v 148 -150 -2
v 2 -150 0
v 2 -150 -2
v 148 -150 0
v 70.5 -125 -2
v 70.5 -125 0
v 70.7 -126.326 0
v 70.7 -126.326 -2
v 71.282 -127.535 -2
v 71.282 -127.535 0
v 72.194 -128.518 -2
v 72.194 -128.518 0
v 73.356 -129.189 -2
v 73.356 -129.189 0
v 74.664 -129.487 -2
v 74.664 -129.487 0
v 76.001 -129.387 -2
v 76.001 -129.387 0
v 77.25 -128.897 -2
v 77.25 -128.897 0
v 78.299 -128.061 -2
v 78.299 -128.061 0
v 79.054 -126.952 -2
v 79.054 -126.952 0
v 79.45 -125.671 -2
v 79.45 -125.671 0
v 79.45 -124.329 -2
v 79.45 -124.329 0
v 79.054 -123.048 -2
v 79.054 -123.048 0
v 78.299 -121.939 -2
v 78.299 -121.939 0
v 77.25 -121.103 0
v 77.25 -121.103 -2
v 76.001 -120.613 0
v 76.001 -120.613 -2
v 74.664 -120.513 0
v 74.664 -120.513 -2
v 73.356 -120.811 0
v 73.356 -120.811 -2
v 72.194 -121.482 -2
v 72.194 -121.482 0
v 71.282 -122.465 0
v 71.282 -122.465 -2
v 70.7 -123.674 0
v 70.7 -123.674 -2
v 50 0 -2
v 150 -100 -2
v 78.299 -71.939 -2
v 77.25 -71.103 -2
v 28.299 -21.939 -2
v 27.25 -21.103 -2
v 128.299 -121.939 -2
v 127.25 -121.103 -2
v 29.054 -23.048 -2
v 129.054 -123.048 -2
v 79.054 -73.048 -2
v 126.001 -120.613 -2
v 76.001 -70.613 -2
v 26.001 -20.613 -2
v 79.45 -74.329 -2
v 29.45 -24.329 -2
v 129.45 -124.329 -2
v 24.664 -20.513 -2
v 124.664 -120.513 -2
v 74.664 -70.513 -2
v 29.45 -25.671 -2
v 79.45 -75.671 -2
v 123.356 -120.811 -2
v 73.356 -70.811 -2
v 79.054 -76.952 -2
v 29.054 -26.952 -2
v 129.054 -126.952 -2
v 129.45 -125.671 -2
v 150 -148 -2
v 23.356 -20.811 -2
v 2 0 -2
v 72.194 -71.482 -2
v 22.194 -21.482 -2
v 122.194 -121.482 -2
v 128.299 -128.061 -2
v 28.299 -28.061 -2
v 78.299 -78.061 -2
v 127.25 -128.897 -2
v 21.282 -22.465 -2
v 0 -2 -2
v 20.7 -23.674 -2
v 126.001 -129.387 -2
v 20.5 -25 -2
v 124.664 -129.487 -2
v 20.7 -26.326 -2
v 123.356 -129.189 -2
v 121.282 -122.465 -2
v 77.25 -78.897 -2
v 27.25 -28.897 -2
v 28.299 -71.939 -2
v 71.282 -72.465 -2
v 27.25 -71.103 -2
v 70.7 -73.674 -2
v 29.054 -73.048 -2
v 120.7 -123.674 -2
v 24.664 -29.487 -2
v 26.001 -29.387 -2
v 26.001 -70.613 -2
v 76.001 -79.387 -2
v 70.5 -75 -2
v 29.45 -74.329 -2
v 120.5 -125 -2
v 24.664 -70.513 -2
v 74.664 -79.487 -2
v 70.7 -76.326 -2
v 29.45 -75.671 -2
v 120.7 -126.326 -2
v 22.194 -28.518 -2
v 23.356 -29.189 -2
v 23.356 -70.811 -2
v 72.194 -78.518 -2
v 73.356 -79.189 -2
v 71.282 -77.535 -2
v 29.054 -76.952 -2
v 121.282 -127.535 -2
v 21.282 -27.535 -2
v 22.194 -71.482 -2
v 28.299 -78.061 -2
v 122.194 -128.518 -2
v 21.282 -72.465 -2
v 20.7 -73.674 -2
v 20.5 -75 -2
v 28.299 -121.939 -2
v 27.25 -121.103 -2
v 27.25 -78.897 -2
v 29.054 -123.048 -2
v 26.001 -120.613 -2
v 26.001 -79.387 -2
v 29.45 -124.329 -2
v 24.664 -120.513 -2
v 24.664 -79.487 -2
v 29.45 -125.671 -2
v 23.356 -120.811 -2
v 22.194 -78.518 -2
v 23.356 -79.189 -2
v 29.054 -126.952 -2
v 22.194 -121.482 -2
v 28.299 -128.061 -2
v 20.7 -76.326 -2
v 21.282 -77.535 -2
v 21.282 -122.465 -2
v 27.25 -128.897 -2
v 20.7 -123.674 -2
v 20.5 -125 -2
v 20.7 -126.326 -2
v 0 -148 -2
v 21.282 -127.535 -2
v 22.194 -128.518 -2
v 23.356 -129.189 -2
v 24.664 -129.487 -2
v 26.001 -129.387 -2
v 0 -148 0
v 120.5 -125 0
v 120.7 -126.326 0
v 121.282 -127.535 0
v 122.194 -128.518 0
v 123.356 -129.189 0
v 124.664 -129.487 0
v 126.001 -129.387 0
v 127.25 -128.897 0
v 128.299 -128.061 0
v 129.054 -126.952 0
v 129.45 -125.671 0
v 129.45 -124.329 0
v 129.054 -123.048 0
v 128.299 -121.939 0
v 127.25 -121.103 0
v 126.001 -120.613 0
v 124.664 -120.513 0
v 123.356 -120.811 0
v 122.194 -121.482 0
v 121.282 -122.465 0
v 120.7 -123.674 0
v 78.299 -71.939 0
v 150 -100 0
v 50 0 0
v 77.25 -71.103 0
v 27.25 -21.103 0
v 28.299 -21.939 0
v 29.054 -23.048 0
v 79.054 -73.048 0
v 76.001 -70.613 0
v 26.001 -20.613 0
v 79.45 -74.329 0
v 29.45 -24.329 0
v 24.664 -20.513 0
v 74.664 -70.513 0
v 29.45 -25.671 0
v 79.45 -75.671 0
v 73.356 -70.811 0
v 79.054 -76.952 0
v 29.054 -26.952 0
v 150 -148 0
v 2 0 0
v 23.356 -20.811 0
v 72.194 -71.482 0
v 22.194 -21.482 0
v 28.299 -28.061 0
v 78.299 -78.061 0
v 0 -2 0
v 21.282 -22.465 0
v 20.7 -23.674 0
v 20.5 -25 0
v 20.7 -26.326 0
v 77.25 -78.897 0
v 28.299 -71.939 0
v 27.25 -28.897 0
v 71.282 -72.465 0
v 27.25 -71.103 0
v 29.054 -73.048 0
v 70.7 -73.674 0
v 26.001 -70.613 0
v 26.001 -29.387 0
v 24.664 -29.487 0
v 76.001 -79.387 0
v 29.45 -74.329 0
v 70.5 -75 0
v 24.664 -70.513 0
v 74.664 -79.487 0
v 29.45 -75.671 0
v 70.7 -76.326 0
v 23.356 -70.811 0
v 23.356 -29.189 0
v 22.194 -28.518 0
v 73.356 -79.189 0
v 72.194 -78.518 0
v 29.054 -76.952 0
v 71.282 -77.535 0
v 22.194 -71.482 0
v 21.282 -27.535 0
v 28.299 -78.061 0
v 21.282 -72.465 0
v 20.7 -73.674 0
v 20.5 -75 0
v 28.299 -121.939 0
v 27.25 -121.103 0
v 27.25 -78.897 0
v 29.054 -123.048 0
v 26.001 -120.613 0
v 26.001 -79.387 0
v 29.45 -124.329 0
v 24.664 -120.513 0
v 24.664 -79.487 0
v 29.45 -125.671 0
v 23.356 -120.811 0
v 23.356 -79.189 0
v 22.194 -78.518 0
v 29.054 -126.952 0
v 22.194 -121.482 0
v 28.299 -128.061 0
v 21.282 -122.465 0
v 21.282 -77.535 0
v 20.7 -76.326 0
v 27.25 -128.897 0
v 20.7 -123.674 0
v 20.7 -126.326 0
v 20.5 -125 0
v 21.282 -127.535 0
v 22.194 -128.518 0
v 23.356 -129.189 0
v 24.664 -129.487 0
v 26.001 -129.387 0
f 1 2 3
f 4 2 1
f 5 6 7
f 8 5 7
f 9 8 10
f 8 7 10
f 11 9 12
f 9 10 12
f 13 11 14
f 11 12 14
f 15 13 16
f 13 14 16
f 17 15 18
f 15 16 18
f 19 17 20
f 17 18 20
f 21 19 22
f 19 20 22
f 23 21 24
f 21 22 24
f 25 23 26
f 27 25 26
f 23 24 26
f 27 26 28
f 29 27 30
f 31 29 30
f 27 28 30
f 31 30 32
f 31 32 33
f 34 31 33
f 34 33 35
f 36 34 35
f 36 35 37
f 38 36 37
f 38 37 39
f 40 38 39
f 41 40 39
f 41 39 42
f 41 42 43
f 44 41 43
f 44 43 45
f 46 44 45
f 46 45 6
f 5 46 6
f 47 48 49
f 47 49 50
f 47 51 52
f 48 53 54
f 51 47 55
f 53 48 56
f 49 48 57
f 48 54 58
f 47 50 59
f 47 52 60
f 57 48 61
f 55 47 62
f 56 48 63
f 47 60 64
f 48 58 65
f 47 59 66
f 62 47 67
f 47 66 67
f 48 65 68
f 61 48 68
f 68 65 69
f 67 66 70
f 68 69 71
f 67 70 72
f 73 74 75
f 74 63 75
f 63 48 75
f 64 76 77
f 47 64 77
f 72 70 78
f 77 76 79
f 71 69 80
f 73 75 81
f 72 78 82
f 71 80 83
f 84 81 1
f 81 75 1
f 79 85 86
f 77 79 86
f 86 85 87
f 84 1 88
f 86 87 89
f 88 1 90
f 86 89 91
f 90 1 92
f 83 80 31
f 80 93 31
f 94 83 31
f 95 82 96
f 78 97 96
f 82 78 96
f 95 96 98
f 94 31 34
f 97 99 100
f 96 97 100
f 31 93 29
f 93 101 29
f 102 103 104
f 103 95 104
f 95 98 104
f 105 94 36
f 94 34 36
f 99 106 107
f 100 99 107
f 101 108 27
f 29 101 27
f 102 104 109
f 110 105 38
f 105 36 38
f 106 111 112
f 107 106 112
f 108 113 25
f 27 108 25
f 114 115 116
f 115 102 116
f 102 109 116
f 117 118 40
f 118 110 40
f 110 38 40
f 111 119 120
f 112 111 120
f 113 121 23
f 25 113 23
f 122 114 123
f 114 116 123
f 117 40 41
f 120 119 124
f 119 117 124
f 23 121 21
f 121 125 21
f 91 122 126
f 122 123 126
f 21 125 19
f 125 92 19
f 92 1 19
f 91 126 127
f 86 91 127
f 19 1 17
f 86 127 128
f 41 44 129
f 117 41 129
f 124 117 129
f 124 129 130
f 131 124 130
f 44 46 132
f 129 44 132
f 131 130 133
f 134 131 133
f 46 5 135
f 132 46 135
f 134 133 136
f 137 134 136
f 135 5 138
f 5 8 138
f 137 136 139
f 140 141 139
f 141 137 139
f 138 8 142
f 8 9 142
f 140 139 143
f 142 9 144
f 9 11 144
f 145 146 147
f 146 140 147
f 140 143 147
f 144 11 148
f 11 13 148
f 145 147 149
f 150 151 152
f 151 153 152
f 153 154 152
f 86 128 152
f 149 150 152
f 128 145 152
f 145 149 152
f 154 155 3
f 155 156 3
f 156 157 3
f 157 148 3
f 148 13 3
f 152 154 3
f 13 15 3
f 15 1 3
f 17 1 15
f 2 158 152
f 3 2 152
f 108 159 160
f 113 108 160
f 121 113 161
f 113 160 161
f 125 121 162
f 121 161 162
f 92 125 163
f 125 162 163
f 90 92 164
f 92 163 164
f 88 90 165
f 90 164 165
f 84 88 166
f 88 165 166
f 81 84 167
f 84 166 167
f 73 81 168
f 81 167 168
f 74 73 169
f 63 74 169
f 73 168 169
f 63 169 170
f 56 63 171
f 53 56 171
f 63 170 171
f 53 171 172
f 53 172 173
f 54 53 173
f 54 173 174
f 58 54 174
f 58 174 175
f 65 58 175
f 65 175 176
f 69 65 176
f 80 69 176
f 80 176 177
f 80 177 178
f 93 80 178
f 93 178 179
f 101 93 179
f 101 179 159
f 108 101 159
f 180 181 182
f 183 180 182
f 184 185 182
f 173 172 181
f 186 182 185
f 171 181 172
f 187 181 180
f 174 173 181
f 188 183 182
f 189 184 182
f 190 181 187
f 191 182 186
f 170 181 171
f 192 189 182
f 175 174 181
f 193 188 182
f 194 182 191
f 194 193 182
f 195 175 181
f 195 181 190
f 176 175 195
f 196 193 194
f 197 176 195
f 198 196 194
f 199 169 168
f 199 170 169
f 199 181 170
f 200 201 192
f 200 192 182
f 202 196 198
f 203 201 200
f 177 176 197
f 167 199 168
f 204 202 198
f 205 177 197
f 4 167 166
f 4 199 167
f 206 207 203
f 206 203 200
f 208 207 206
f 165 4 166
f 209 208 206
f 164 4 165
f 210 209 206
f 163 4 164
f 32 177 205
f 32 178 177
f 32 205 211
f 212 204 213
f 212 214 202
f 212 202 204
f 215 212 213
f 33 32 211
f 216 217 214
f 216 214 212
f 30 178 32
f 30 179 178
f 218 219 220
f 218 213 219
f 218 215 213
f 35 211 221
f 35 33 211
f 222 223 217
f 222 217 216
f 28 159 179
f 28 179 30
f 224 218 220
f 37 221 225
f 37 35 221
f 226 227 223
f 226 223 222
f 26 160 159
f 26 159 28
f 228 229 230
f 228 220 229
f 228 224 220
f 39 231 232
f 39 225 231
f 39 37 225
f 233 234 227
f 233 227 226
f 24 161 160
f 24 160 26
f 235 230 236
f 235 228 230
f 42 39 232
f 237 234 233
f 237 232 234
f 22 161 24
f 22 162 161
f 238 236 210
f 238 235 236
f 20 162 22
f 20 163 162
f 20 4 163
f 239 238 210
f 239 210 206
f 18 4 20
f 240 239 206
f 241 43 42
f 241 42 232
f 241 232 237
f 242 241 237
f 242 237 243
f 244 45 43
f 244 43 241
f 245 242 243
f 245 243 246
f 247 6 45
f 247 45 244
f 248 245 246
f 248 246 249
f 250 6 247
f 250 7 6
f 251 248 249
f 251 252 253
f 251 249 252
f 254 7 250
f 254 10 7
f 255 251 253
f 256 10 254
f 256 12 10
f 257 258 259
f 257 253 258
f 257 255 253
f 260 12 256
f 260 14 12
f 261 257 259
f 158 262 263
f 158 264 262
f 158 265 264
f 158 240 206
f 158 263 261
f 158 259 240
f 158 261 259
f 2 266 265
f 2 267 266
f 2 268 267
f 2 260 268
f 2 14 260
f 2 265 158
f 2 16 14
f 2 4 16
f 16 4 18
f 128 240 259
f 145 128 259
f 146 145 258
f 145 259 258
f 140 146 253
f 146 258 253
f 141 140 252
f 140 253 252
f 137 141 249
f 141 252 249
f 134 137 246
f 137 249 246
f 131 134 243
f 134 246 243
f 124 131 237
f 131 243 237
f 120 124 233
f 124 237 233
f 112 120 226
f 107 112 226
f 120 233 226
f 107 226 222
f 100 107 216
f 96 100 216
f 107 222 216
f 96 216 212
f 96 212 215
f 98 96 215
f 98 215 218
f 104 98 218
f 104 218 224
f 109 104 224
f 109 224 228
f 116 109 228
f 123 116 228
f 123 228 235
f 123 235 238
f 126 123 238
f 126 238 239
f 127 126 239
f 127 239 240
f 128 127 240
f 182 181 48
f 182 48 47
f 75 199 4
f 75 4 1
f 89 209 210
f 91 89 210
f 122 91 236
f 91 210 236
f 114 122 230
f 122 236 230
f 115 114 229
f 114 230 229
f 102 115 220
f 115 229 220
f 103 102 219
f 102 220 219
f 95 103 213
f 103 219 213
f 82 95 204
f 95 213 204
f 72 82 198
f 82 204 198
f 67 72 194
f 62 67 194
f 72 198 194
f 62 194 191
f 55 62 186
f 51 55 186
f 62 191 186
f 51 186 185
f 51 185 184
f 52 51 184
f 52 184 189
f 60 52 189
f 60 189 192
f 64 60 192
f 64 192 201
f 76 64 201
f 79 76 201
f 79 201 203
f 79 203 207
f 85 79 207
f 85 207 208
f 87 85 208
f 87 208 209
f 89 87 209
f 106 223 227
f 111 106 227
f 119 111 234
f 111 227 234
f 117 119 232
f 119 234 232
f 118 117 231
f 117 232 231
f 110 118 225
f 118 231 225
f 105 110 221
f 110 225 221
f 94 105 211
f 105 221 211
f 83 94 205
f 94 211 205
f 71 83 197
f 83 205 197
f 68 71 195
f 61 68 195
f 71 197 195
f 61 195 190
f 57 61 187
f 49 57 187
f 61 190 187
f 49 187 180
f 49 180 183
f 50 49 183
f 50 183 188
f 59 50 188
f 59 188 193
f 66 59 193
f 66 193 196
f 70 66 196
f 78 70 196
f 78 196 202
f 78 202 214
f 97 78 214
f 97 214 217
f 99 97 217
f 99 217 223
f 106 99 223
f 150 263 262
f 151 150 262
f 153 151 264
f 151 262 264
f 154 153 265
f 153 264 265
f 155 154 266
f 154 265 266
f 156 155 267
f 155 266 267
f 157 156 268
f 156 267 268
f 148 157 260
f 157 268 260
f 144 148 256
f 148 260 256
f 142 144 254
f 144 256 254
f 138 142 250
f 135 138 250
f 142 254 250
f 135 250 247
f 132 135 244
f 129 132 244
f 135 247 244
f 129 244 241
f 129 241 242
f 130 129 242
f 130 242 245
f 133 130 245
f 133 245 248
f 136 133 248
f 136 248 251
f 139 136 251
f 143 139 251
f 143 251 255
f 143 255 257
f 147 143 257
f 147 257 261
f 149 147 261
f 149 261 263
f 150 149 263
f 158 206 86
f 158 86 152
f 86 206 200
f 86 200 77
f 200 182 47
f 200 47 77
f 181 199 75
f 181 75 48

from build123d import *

# Parameters (mm, degrees)
EXTRUDE_1_DEPTH   = 2
HOLE_WIZARD_M81_D = 9
CHAMFER_1_SIZE    = 2


with BuildPart() as part:
    # Эскиз1 → Бобышка-Вытянуть1 (new body)
    with BuildSketch(Plane(origin=(0, 0, 0), x_dir=(1, 0, 0), z_dir=(0, 0, -1))):
        Polygon((0, 0), (0, 150), (150, 150), (150, 100), (50, 0), align=None)
    extrude(amount=EXTRUDE_1_DEPTH)

    # Отверстие с зазором M81 (through all)
    with Locations(Plane(origin=(0, 0, -2), x_dir=(1, 0, 0), z_dir=(0, 0, -1))):
        with Locations((75, 125), (25, 125), (25, 75), (25, 25), (125, 125), (75, 75)):
            Hole(HOLE_WIZARD_M81_D / 2)

    # Фаска1
    chamfer_1_edges = [part.edges().sort_by_distance(p)[0] for p in [
        (0, 0, -1),
        (0, -150, -1),
        (150, -150, -1),
    ]]
    chamfer(chamfer_1_edges, length=CHAMFER_1_SIZE)


solid = part.part
